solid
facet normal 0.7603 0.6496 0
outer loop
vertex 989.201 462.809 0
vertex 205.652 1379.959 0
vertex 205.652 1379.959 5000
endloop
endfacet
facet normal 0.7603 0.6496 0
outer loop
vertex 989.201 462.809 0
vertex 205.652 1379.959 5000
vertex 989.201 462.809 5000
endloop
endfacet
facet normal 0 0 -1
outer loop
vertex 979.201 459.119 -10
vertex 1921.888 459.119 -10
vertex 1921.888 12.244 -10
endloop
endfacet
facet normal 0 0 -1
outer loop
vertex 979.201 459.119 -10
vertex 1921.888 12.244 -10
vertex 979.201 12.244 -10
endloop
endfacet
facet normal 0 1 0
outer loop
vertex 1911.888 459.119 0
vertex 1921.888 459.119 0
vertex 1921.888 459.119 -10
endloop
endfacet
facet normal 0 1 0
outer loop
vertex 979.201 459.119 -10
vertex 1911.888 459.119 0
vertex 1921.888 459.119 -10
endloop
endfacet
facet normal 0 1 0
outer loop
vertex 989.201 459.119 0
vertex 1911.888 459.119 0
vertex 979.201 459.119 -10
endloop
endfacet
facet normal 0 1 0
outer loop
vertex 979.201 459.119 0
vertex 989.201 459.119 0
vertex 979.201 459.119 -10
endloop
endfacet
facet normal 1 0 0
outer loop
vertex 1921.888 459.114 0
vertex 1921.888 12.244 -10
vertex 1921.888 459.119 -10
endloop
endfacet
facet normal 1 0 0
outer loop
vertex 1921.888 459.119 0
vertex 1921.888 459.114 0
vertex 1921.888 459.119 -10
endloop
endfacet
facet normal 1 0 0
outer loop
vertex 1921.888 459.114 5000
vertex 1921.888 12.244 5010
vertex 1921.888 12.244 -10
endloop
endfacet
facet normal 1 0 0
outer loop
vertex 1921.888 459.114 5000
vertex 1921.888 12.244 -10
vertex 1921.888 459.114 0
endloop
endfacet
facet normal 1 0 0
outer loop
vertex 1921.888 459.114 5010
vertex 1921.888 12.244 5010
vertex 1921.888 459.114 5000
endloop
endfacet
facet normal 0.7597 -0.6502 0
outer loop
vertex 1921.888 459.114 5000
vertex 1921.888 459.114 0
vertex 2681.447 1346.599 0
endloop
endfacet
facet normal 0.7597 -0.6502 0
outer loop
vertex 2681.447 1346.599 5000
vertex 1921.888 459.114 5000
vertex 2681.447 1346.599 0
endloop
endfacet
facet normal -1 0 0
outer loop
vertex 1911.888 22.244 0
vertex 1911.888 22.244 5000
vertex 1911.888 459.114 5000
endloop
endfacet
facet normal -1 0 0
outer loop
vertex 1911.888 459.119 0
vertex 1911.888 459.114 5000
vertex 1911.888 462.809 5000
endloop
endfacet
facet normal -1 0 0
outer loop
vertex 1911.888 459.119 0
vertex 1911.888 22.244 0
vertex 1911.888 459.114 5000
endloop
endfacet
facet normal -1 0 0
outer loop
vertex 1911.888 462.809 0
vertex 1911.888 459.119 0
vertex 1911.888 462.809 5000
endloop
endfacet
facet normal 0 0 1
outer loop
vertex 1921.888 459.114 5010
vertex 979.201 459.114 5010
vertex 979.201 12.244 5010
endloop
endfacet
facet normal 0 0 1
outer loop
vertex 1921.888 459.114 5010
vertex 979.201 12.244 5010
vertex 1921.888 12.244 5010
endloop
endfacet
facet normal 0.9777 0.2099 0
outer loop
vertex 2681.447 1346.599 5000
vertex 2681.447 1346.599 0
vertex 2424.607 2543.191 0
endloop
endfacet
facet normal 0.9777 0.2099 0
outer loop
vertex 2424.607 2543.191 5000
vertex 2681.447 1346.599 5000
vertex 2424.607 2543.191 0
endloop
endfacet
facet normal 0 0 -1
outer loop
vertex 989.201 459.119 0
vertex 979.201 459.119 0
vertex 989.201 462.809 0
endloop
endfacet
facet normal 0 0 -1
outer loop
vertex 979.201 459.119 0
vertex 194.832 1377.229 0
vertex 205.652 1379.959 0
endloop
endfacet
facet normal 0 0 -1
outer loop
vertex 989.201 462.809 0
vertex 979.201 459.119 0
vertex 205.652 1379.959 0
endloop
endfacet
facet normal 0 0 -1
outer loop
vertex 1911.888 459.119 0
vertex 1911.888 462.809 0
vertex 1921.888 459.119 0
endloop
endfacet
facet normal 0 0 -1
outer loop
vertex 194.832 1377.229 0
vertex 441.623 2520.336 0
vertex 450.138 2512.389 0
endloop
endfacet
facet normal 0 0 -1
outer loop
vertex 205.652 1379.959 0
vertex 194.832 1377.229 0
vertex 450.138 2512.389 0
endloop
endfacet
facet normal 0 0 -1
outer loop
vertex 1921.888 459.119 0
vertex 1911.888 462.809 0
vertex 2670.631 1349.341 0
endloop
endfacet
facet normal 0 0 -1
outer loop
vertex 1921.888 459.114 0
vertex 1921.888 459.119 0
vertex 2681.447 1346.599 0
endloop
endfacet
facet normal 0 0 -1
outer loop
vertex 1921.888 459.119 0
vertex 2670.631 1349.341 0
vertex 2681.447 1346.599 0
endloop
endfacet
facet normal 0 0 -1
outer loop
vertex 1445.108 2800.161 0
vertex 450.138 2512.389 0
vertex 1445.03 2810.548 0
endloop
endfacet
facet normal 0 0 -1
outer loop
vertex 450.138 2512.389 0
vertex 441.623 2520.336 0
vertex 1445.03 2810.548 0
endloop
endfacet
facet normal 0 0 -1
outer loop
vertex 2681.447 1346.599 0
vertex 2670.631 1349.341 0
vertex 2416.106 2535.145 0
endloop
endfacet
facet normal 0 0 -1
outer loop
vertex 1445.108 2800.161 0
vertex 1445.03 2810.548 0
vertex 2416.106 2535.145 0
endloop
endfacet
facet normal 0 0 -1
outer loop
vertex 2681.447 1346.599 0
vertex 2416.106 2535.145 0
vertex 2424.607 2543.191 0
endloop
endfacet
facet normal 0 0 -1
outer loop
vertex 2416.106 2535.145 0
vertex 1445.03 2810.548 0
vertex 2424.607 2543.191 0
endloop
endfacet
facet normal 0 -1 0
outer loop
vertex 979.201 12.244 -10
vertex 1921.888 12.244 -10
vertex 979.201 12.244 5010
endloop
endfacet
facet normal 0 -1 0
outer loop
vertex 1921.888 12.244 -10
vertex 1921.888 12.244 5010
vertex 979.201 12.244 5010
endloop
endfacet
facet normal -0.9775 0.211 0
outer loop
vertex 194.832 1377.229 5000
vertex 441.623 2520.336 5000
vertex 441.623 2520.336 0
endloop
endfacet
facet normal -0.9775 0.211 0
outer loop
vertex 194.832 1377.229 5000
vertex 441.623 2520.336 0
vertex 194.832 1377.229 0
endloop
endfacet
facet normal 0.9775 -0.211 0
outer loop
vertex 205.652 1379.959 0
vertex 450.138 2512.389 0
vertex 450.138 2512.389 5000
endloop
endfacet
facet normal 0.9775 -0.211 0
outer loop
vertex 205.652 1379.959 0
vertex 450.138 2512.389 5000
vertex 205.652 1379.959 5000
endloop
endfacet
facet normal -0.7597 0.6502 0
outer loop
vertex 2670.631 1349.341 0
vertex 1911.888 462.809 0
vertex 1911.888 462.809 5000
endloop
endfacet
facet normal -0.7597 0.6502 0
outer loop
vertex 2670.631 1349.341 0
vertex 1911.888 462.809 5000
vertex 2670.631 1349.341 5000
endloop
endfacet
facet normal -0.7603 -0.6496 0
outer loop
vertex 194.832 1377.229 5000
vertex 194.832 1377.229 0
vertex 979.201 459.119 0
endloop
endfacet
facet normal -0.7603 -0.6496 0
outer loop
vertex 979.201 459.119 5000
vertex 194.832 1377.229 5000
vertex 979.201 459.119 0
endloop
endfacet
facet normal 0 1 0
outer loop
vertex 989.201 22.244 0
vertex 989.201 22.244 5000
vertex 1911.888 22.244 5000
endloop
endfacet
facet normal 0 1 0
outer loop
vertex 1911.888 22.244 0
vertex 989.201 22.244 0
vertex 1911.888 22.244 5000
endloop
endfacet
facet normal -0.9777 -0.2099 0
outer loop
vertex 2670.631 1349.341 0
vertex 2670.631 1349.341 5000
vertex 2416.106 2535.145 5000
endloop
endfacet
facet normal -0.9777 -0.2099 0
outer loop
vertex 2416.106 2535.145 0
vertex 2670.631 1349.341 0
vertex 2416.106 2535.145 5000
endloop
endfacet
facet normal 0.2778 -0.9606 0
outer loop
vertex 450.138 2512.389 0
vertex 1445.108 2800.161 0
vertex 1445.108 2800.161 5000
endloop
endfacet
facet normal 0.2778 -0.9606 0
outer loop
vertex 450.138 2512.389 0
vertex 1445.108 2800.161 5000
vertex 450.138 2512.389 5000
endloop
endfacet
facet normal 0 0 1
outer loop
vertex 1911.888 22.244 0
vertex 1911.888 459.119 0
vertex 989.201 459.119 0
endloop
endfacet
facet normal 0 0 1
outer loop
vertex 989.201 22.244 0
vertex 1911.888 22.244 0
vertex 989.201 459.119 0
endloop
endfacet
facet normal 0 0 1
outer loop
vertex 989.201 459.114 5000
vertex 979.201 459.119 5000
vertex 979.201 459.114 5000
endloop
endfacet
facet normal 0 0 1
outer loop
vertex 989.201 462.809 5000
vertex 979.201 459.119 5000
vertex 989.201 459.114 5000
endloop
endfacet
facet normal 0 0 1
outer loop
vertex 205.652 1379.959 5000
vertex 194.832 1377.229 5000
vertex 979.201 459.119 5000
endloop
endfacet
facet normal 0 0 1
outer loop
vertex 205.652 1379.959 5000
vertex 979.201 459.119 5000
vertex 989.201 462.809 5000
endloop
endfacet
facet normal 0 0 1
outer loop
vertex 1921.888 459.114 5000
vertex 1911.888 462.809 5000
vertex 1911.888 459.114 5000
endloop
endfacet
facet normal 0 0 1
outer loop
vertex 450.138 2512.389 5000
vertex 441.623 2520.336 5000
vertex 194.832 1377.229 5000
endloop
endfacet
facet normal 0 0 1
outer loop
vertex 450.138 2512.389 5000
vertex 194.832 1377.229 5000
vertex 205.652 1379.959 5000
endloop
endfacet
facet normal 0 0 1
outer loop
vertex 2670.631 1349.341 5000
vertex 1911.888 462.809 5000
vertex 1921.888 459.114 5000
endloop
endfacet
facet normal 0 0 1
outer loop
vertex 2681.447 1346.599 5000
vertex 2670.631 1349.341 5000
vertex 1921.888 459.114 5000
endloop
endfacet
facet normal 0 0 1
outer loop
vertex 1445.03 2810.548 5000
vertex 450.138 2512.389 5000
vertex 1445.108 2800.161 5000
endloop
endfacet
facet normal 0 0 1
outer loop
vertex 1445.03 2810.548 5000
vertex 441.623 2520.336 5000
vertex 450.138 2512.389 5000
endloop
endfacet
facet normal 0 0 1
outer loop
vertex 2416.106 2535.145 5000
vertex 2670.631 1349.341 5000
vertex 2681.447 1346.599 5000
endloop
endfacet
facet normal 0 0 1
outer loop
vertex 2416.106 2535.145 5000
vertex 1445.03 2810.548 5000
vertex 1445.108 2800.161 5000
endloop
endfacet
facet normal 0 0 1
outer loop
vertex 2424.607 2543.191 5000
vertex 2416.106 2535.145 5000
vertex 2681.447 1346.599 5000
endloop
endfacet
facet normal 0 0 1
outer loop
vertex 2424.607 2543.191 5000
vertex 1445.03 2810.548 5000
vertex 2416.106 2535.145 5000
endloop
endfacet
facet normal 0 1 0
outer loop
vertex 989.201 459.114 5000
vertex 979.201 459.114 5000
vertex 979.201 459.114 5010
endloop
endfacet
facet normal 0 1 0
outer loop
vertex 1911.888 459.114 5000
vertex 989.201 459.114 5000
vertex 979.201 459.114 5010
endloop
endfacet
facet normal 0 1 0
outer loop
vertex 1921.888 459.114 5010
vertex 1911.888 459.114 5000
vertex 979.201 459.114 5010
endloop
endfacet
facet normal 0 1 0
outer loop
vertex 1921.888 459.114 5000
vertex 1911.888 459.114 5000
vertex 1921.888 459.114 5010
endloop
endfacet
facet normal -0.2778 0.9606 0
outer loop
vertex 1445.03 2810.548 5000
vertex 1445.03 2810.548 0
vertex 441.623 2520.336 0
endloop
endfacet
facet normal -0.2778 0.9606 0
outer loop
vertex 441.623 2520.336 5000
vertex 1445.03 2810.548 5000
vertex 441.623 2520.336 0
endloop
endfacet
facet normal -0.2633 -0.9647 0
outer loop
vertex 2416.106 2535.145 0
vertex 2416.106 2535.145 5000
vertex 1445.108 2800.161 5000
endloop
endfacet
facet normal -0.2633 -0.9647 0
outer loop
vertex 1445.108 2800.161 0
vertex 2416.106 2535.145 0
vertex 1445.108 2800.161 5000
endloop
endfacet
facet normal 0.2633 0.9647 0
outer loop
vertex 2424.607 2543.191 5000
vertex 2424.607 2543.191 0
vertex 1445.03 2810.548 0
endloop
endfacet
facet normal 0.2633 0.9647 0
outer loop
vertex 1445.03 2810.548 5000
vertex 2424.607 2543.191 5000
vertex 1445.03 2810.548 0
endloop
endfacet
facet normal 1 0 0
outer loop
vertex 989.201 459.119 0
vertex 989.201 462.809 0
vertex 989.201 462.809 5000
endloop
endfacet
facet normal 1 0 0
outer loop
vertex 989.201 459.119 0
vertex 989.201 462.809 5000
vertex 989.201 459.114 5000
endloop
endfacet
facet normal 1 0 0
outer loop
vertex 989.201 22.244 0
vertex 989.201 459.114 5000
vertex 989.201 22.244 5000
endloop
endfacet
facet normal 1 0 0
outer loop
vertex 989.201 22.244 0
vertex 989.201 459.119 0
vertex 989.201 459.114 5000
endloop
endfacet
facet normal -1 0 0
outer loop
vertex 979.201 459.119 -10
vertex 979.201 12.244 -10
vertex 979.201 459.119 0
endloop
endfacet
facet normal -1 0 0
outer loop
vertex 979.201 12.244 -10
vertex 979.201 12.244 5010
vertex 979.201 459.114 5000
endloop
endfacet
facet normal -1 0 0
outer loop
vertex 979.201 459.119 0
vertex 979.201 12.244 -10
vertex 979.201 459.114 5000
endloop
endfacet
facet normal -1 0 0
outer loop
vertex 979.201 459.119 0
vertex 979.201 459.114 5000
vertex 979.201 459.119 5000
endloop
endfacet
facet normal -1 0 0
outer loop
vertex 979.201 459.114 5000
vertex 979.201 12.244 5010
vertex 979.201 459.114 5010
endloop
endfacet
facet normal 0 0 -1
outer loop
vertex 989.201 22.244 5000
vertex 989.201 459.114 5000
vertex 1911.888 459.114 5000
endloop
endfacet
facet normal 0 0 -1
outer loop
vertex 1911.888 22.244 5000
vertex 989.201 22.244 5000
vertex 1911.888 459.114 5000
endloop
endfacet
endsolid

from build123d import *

# Parameters (mm, degrees)
EXTRUDE_THIN1_DEPTH = 5000
SKETCH3_W           = 942.686486423
SKETCH3_H           = 446.87009075
BOSS_EXTRUDE1_DEPTH = 10
SKETCH4_W           = 942.686486423
SKETCH4_H           = 446.875098961
BOSS_EXTRUDE2_DEPTH = 10
BOSS_EXTRUDE5_DEPTH = 500
BOSS_EXTRUDE5_DRAFT = -20


with BuildPart() as part:
    # Sketch2 → Extrude-Thin1 (new body)
    with BuildSketch(Plane.XY):
        Polygon((1921.887541059, 12.24380069), (1921.887541059, 459.11389144), (2681.447187748, 1346.59937336), (2424.606954424, 2543.190863223), (1445.029500253, 2810.547934615), (441.623250623, 2520.336455312), (194.832132021, 1377.229025334), (979.201054636, 459.118899651), (979.201054636, 12.24380069), align=None)
        Polygon((1911.887541059, 22.24380069), (1911.887541059, 462.808912872), (2670.631005203, 1349.340749924), (2416.106129236, 2535.14523468), (1445.107934874, 2800.160759962), (450.137888664, 2512.38925258), (205.652, 1379.959376498), (989.201054636, 462.808912872), (989.201054636, 22.24380069), align=None, mode=Mode.SUBTRACT)
    extrude(amount=EXTRUDE_THIN1_DEPTH)

    # Sketch3 → Boss-Extrude1 (add)
    with BuildSketch(Plane.XY.offset(5000)):
        with Locations((1450.544297848, 235.678846065)):
            Rectangle(SKETCH3_W, SKETCH3_H)
    extrude(amount=BOSS_EXTRUDE1_DEPTH)

    # Sketch4 → Boss-Extrude2 (add)
    with BuildSketch(Plane(origin=(0, 0, 0), x_dir=(-1, 0, 0), z_dir=(0, 0, -1))):
        with Locations((-1450.544297848, 235.681350171)):
            Rectangle(SKETCH4_W, SKETCH4_H)
    extrude(amount=BOSS_EXTRUDE2_DEPTH)


with BuildPart() as body_2:
    # Sketch5 → Boss-Extrude5 (with draft: the straight prism first)
    with BuildSketch(Plane.XY.offset(5000)):
        Polygon((989.201054636, 462.808912872), (1911.887541059, 462.808912872), (2670.631005203, 1349.340749924), (2416.106129236, 2535.14523468), (1445.107934874, 2800.160759962), (450.137888664, 2512.38925258), (205.652, 1379.959376498), align=None)
    extrude(amount=BOSS_EXTRUDE5_DEPTH)
    # Boss-Extrude5: the draft: its side faces are tilted about the plane it starts from
    boss_extrude5_sides = [body_2.faces().sort_by_distance(p)[0] for p in [
        (1450.544297848, 462.808912872, 5250),
        (2291.259273131, 906.074831398, 5250),
        (2543.368567219, 1942.242992302, 5250),
        (1930.607032055, 2667.652997321, 5250),
        (947.622911769, 2656.275006271, 5250),
        (327.894944332, 1946.174314539, 5250),
        (597.426527318, 921.384144685, 5250),
    ]]
    draft(boss_extrude5_sides, Plane.XY.offset(5000), BOSS_EXTRUDE5_DRAFT)

    # DeleteFace3: 1 face struck out; the rest of the skin is kept as a surface, the solid goes
    deleteface3_1_drop = [body_2.part.faces().sort_by_distance(Vector(p))[0] for p in ((1442.550000381, 1637.724947921, 5500),)]
    deleteface3_1 = Shell(body_2.part.faces() - deleteface3_1_drop)


solid = part.part
